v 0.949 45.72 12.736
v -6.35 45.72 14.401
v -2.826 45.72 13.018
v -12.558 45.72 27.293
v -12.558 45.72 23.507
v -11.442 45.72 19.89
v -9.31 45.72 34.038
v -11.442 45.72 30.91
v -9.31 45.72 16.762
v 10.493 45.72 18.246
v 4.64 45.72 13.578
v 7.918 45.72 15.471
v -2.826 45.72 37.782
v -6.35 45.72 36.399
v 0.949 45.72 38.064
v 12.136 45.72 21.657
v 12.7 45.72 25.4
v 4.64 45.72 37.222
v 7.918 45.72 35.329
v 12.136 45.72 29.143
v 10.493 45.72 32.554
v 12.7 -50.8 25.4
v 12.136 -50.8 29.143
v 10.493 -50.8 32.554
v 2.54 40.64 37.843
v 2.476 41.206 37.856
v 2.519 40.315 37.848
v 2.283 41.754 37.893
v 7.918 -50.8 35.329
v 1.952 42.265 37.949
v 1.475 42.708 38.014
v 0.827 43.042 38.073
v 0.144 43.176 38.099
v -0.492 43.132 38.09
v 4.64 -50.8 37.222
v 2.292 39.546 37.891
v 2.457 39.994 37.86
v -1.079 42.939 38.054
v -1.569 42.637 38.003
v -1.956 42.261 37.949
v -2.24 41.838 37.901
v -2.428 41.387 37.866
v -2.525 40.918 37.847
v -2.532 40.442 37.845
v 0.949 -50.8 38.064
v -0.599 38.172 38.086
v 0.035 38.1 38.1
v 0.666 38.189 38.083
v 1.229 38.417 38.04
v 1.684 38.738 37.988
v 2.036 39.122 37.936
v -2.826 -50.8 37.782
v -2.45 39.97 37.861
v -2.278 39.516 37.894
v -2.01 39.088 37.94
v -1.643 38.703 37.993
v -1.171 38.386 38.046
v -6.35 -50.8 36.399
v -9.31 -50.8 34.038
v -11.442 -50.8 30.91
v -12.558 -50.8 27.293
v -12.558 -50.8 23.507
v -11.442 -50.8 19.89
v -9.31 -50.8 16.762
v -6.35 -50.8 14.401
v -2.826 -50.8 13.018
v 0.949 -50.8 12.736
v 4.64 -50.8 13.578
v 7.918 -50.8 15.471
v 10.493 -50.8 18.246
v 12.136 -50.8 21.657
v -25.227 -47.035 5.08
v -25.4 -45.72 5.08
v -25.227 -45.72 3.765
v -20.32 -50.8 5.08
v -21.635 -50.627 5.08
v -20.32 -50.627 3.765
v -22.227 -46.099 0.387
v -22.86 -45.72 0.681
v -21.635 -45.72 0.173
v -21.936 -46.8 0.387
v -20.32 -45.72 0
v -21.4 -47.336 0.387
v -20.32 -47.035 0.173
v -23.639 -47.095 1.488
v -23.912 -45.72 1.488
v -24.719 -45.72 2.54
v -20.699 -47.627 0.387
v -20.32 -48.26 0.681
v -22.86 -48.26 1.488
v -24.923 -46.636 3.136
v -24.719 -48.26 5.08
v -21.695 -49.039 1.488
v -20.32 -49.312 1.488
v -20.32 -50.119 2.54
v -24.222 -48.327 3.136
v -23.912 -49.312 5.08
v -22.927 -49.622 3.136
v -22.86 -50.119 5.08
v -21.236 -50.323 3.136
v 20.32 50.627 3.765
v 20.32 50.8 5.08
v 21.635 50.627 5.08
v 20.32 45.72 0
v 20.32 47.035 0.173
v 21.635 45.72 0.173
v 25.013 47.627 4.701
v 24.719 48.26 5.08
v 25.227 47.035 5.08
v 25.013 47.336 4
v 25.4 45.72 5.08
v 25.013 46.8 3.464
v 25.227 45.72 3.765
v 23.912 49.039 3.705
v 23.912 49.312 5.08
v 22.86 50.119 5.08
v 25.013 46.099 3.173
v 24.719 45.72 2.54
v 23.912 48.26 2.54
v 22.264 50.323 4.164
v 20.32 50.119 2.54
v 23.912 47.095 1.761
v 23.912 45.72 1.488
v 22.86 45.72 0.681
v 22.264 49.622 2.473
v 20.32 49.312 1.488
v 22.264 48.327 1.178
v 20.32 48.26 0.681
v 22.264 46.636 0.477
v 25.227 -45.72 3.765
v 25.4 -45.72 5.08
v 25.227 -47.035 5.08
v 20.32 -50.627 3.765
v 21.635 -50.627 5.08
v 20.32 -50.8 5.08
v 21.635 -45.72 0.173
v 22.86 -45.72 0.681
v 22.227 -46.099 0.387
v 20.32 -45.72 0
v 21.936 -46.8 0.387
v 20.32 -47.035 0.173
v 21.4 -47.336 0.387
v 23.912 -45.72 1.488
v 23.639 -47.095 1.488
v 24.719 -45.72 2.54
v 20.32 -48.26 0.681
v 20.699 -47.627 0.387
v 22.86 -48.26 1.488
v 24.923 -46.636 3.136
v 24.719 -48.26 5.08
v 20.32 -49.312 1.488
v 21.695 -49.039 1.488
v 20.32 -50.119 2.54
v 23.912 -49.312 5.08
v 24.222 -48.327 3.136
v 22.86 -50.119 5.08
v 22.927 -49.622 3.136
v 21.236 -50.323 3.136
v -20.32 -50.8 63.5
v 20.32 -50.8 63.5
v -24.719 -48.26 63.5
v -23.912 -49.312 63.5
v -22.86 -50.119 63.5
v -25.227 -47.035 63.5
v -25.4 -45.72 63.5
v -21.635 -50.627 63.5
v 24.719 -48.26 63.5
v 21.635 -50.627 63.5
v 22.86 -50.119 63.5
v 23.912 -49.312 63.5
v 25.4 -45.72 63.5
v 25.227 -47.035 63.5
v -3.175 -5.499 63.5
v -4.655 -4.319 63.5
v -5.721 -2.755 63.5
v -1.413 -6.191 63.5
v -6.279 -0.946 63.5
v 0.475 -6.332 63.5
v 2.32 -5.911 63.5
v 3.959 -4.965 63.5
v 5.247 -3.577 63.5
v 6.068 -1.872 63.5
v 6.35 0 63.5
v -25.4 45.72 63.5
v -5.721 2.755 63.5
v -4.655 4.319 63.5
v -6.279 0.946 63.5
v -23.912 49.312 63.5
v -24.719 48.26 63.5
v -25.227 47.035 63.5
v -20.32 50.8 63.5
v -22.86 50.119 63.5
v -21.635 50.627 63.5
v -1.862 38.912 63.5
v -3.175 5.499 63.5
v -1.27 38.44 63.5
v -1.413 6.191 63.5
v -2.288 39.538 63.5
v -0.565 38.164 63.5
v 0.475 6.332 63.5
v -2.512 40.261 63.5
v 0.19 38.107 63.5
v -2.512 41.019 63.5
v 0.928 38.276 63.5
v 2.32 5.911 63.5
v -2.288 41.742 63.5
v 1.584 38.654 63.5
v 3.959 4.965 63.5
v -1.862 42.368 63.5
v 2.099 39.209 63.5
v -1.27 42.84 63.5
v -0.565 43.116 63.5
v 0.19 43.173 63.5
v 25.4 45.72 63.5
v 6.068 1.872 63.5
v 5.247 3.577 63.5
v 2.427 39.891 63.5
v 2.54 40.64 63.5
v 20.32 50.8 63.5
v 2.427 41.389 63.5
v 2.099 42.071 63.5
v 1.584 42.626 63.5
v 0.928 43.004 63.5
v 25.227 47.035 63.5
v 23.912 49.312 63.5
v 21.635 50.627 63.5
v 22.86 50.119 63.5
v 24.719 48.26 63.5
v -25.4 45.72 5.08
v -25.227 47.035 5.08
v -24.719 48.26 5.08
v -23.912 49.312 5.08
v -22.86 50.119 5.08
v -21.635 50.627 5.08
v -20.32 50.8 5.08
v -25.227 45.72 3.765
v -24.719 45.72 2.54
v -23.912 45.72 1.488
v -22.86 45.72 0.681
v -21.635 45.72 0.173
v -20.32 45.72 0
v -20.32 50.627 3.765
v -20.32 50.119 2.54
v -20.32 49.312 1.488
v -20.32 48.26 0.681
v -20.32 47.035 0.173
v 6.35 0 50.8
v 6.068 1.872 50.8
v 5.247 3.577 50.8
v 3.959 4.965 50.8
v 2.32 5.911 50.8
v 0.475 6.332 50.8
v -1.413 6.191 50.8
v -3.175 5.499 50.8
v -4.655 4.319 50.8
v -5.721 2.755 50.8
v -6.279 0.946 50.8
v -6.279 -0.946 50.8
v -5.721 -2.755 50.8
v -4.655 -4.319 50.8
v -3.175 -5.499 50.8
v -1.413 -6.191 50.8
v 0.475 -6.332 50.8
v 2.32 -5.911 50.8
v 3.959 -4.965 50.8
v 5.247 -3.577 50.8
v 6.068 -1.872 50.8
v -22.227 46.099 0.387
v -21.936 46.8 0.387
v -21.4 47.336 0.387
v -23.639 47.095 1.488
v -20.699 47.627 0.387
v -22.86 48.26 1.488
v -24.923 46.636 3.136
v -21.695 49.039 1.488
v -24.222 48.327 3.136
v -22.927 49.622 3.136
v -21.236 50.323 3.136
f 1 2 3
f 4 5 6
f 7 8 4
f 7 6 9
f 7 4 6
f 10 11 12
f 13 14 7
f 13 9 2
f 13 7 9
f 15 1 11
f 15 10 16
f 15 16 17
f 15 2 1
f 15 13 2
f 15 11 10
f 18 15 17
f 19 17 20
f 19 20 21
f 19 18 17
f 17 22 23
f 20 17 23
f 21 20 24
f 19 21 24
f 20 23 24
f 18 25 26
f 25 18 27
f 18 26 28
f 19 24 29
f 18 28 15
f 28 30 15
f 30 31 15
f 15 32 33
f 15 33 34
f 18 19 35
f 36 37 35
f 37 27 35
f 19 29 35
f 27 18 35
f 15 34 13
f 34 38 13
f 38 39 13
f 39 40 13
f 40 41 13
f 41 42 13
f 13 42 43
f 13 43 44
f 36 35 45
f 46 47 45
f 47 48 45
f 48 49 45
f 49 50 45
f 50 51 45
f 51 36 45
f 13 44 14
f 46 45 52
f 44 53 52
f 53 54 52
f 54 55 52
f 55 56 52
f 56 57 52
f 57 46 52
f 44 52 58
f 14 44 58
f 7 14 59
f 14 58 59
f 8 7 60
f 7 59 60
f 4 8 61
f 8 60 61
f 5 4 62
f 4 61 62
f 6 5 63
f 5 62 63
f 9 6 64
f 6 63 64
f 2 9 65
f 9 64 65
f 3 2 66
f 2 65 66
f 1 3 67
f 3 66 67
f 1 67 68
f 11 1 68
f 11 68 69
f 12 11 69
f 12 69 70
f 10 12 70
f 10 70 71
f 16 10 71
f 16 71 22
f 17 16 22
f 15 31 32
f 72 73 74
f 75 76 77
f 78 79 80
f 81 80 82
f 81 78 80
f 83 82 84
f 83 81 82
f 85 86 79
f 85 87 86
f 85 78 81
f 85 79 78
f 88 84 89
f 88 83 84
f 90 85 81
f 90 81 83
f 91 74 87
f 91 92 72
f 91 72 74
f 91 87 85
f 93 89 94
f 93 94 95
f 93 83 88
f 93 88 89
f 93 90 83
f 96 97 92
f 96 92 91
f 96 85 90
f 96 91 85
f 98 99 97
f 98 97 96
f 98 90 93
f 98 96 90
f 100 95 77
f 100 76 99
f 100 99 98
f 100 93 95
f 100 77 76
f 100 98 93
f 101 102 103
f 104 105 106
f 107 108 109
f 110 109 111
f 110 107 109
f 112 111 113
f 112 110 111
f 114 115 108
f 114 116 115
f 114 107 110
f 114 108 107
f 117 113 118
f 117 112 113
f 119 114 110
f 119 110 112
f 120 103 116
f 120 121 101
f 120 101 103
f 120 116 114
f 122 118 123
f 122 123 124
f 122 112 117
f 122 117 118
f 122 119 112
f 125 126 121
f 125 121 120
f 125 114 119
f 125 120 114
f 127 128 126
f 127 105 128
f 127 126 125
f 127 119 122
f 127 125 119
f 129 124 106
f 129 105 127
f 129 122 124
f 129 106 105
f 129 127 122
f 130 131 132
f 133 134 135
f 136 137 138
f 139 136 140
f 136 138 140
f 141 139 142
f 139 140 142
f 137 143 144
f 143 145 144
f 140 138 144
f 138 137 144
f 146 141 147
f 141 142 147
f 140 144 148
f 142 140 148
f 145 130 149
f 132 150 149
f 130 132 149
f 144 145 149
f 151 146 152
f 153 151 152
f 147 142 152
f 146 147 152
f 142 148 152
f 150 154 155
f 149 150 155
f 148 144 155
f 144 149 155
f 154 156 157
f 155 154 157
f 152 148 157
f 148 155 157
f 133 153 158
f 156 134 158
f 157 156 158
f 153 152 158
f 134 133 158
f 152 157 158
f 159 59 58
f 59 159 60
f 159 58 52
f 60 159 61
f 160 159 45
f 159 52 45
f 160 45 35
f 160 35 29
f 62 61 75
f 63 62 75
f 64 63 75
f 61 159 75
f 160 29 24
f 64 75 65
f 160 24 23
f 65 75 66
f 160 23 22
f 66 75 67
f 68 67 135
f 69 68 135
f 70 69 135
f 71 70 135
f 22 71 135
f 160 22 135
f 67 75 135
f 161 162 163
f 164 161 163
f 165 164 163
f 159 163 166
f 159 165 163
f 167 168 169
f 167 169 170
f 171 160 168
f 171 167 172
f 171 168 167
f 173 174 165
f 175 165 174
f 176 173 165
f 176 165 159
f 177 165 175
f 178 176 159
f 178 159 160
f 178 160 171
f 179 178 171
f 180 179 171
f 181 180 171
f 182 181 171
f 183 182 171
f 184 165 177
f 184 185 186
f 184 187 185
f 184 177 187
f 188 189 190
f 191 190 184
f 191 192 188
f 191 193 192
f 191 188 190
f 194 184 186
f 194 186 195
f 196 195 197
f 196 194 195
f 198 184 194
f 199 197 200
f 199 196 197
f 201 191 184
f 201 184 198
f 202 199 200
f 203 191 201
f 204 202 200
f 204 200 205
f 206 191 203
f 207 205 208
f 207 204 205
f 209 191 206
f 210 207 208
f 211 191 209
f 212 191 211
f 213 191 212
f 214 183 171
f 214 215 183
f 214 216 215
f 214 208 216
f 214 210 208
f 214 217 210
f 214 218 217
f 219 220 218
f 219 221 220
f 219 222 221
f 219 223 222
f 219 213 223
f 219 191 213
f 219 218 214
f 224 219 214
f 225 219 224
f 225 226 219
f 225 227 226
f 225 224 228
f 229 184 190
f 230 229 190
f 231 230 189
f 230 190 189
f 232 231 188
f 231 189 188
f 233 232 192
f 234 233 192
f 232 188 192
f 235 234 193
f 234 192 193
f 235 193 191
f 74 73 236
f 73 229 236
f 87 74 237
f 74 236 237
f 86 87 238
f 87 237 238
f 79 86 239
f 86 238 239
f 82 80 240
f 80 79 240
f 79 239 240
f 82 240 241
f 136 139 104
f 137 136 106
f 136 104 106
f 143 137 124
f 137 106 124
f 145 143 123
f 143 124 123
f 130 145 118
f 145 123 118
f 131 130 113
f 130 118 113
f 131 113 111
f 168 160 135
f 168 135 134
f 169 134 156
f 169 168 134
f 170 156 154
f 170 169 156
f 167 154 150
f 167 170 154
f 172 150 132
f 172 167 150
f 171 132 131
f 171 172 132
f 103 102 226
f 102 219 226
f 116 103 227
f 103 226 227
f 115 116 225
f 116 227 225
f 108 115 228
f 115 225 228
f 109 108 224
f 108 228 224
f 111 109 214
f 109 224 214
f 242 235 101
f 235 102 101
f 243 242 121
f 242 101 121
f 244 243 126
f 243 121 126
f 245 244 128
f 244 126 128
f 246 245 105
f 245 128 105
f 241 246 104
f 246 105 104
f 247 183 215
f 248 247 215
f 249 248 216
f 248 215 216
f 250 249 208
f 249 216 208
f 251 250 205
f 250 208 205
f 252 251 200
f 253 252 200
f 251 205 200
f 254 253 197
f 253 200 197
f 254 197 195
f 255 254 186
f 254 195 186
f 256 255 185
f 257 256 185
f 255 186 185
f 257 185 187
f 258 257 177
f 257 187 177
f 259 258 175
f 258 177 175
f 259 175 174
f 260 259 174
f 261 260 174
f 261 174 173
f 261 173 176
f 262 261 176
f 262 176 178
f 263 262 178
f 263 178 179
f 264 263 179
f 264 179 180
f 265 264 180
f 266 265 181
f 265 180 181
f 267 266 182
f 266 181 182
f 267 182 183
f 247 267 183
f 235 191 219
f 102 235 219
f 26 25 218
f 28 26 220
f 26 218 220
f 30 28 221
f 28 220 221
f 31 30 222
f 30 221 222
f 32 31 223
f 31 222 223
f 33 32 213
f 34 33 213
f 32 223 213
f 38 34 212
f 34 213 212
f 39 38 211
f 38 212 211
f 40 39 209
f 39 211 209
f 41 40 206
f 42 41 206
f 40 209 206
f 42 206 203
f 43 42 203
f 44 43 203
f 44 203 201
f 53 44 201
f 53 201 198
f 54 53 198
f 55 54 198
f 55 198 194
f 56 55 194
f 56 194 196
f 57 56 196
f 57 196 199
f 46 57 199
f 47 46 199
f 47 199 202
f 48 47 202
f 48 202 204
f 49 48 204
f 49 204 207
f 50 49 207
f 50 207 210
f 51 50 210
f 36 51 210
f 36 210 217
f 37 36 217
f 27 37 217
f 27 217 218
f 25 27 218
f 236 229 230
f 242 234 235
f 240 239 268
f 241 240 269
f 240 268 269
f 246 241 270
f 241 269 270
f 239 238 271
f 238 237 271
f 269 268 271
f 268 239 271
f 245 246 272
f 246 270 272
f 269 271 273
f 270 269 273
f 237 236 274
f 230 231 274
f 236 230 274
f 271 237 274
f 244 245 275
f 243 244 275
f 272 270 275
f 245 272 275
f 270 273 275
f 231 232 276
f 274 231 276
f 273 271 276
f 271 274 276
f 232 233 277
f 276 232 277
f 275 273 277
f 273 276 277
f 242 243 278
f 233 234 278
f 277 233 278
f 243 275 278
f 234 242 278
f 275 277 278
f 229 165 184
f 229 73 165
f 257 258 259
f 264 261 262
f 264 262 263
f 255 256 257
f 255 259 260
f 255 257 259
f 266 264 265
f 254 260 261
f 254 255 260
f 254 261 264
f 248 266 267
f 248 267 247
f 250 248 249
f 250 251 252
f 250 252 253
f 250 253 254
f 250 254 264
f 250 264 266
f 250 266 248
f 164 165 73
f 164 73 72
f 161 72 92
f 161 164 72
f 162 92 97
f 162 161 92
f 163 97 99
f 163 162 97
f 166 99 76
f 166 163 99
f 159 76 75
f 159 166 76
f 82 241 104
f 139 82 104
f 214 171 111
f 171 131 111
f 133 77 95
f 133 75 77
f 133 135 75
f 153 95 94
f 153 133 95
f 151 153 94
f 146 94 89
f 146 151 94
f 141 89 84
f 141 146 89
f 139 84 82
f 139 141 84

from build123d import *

# Parameters (mm, degrees)
F0_W     = 50.8
F0_H     = 101.6
F1_DEPTH = 63.5
F2_R     = 12.7
F3_DEPTH = 96.52
F4_R     = 2.54
F5_DEPTH = 36.322
F6_R     = 6.35
F7_DEPTH = 12.7
F8_R     = 5.08


with BuildPart() as f1:
    # F0 (on Top) → F1 (new body)
    with BuildSketch(Plane.XY):
        Rectangle(F0_W, F0_H)
    extrude(amount=F1_DEPTH)

    # F2 (on face) → F3 (cut)
    with BuildSketch(Plane.XZ.offset(50.8)):
        with Locations((0, 25.4)):
            Circle(F2_R)
    extrude(amount=-F3_DEPTH, mode=Mode.SUBTRACT)

    # F4 (on face) → F5 (cut)
    with BuildSketch(Plane.XY.offset(63.5)):
        with Locations((0, 40.64)):
            Circle(F4_R)
    extrude(amount=-F5_DEPTH, mode=Mode.SUBTRACT)

    # F6 (on face) → F7 (cut)
    with BuildSketch(Plane.XY.offset(63.5)):
        Circle(F6_R)
    extrude(amount=-F7_DEPTH, mode=Mode.SUBTRACT)

    # F8
    f8_edges = [f1.edges().sort_by_distance(p)[0] for p in [
        (25.4, -50.8, 31.75),
        (-25.4, -50.8, 31.75),
        (-25.4, 50.8, 31.75),
        (-25.4, 0, 0),
        (0, 50.8, 0),
        (25.4, 50.8, 31.75),
        (25.4, 0, 0),
        (0, -50.8, 0),
    ]]
    fillet(f8_edges, radius=F8_R)


solid = f1.part
